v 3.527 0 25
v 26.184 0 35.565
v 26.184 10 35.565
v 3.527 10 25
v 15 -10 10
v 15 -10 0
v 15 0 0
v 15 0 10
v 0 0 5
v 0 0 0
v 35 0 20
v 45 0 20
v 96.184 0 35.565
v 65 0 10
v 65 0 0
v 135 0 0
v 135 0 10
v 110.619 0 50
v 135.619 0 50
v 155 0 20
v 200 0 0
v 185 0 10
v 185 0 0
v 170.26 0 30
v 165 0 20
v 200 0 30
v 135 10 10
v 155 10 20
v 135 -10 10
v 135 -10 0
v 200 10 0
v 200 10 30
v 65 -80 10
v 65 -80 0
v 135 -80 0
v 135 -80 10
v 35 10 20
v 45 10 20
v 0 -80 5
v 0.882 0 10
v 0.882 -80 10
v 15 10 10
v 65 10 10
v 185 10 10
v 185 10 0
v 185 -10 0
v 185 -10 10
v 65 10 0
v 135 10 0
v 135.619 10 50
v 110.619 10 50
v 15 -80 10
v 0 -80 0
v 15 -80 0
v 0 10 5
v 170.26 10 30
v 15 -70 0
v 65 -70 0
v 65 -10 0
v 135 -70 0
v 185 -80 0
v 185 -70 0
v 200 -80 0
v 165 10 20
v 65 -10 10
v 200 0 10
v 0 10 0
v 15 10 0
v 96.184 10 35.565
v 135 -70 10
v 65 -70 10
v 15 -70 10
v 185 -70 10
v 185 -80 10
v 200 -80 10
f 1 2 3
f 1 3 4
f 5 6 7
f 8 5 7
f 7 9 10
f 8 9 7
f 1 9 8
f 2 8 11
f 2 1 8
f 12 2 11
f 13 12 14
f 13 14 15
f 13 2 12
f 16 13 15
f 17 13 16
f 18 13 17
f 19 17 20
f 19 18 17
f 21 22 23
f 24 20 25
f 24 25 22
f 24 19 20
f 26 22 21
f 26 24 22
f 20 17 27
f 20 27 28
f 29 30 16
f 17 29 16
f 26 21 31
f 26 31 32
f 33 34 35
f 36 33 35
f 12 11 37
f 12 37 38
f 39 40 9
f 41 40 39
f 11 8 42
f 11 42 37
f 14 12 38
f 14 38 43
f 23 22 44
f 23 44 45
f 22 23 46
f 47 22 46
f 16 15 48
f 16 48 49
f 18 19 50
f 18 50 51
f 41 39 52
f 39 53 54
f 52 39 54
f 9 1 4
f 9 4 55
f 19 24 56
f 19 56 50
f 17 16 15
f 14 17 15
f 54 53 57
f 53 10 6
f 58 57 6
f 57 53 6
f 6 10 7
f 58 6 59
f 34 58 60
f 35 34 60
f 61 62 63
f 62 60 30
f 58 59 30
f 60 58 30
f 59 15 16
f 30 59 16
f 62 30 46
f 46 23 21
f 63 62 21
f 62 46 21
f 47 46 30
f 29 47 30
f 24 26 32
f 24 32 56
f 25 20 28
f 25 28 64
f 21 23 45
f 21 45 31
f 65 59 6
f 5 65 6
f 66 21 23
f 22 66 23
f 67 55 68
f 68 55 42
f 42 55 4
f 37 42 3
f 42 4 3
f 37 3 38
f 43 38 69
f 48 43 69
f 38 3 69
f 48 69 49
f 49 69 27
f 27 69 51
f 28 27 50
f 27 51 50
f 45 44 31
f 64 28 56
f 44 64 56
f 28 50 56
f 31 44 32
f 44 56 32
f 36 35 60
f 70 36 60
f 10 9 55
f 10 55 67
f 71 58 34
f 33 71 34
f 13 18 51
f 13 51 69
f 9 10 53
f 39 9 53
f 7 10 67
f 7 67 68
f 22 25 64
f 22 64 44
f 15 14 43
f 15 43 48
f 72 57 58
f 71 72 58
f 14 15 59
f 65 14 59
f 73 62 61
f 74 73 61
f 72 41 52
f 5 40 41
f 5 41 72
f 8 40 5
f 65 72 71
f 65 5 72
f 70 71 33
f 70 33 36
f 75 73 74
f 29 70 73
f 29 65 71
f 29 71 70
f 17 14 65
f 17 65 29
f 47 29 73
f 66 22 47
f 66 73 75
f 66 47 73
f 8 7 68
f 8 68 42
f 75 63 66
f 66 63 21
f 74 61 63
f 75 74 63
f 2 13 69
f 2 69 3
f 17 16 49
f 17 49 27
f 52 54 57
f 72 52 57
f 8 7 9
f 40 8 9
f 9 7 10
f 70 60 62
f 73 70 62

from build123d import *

# Parameters (mm, degrees)
F2_DEPTH = 10
F3_DEPTH = 10
F4_SIZE2 = 0.881635
F4_SIZE  = 5


with BuildPart() as f2:
    # F1 (on Top) → F2 (new body)
    with BuildSketch(Plane.XY):
        Polygon((15, 0), (0, 0), (0, -80), (15, -80), (15, -70), (65, -70), (65, -80), (135, -80), (135, -70), (185, -70), (185, -80), (200, -80), (200, 0), (185, 0), (185, -10), (135, -10), (135, 0), (65, 0), (65, -10), (15, -10), align=None)
    extrude(amount=F2_DEPTH)

    # F4
    f4_edges = [f2.edges().sort_by_distance(p)[0] for p in [
        (0, -40, 10),
    ]]
    chamfer(f4_edges, length=F4_SIZE, length2=F4_SIZE2)


with BuildPart() as f3:
    # F0 (on Front) → F3 (new body)
    with BuildSketch(Plane.XZ):
        Polygon((0, 5), (0, 0), (15, 0), (15, 10), (35, 20), (45, 20), (65, 10), (65, 0), (135, 0), (135, 10), (155, 20), (165, 20), (185, 10), (185, 0), (200, 0), (200, 30), (170.259794, 30), (135.618778, 50), (110.618778, 50), (96.184234, 35.565457), (26.184234, 35.565457), (3.52654, 25), align=None)
    extrude(amount=-F3_DEPTH)


solid = Compound([f2.part, f3.part])
